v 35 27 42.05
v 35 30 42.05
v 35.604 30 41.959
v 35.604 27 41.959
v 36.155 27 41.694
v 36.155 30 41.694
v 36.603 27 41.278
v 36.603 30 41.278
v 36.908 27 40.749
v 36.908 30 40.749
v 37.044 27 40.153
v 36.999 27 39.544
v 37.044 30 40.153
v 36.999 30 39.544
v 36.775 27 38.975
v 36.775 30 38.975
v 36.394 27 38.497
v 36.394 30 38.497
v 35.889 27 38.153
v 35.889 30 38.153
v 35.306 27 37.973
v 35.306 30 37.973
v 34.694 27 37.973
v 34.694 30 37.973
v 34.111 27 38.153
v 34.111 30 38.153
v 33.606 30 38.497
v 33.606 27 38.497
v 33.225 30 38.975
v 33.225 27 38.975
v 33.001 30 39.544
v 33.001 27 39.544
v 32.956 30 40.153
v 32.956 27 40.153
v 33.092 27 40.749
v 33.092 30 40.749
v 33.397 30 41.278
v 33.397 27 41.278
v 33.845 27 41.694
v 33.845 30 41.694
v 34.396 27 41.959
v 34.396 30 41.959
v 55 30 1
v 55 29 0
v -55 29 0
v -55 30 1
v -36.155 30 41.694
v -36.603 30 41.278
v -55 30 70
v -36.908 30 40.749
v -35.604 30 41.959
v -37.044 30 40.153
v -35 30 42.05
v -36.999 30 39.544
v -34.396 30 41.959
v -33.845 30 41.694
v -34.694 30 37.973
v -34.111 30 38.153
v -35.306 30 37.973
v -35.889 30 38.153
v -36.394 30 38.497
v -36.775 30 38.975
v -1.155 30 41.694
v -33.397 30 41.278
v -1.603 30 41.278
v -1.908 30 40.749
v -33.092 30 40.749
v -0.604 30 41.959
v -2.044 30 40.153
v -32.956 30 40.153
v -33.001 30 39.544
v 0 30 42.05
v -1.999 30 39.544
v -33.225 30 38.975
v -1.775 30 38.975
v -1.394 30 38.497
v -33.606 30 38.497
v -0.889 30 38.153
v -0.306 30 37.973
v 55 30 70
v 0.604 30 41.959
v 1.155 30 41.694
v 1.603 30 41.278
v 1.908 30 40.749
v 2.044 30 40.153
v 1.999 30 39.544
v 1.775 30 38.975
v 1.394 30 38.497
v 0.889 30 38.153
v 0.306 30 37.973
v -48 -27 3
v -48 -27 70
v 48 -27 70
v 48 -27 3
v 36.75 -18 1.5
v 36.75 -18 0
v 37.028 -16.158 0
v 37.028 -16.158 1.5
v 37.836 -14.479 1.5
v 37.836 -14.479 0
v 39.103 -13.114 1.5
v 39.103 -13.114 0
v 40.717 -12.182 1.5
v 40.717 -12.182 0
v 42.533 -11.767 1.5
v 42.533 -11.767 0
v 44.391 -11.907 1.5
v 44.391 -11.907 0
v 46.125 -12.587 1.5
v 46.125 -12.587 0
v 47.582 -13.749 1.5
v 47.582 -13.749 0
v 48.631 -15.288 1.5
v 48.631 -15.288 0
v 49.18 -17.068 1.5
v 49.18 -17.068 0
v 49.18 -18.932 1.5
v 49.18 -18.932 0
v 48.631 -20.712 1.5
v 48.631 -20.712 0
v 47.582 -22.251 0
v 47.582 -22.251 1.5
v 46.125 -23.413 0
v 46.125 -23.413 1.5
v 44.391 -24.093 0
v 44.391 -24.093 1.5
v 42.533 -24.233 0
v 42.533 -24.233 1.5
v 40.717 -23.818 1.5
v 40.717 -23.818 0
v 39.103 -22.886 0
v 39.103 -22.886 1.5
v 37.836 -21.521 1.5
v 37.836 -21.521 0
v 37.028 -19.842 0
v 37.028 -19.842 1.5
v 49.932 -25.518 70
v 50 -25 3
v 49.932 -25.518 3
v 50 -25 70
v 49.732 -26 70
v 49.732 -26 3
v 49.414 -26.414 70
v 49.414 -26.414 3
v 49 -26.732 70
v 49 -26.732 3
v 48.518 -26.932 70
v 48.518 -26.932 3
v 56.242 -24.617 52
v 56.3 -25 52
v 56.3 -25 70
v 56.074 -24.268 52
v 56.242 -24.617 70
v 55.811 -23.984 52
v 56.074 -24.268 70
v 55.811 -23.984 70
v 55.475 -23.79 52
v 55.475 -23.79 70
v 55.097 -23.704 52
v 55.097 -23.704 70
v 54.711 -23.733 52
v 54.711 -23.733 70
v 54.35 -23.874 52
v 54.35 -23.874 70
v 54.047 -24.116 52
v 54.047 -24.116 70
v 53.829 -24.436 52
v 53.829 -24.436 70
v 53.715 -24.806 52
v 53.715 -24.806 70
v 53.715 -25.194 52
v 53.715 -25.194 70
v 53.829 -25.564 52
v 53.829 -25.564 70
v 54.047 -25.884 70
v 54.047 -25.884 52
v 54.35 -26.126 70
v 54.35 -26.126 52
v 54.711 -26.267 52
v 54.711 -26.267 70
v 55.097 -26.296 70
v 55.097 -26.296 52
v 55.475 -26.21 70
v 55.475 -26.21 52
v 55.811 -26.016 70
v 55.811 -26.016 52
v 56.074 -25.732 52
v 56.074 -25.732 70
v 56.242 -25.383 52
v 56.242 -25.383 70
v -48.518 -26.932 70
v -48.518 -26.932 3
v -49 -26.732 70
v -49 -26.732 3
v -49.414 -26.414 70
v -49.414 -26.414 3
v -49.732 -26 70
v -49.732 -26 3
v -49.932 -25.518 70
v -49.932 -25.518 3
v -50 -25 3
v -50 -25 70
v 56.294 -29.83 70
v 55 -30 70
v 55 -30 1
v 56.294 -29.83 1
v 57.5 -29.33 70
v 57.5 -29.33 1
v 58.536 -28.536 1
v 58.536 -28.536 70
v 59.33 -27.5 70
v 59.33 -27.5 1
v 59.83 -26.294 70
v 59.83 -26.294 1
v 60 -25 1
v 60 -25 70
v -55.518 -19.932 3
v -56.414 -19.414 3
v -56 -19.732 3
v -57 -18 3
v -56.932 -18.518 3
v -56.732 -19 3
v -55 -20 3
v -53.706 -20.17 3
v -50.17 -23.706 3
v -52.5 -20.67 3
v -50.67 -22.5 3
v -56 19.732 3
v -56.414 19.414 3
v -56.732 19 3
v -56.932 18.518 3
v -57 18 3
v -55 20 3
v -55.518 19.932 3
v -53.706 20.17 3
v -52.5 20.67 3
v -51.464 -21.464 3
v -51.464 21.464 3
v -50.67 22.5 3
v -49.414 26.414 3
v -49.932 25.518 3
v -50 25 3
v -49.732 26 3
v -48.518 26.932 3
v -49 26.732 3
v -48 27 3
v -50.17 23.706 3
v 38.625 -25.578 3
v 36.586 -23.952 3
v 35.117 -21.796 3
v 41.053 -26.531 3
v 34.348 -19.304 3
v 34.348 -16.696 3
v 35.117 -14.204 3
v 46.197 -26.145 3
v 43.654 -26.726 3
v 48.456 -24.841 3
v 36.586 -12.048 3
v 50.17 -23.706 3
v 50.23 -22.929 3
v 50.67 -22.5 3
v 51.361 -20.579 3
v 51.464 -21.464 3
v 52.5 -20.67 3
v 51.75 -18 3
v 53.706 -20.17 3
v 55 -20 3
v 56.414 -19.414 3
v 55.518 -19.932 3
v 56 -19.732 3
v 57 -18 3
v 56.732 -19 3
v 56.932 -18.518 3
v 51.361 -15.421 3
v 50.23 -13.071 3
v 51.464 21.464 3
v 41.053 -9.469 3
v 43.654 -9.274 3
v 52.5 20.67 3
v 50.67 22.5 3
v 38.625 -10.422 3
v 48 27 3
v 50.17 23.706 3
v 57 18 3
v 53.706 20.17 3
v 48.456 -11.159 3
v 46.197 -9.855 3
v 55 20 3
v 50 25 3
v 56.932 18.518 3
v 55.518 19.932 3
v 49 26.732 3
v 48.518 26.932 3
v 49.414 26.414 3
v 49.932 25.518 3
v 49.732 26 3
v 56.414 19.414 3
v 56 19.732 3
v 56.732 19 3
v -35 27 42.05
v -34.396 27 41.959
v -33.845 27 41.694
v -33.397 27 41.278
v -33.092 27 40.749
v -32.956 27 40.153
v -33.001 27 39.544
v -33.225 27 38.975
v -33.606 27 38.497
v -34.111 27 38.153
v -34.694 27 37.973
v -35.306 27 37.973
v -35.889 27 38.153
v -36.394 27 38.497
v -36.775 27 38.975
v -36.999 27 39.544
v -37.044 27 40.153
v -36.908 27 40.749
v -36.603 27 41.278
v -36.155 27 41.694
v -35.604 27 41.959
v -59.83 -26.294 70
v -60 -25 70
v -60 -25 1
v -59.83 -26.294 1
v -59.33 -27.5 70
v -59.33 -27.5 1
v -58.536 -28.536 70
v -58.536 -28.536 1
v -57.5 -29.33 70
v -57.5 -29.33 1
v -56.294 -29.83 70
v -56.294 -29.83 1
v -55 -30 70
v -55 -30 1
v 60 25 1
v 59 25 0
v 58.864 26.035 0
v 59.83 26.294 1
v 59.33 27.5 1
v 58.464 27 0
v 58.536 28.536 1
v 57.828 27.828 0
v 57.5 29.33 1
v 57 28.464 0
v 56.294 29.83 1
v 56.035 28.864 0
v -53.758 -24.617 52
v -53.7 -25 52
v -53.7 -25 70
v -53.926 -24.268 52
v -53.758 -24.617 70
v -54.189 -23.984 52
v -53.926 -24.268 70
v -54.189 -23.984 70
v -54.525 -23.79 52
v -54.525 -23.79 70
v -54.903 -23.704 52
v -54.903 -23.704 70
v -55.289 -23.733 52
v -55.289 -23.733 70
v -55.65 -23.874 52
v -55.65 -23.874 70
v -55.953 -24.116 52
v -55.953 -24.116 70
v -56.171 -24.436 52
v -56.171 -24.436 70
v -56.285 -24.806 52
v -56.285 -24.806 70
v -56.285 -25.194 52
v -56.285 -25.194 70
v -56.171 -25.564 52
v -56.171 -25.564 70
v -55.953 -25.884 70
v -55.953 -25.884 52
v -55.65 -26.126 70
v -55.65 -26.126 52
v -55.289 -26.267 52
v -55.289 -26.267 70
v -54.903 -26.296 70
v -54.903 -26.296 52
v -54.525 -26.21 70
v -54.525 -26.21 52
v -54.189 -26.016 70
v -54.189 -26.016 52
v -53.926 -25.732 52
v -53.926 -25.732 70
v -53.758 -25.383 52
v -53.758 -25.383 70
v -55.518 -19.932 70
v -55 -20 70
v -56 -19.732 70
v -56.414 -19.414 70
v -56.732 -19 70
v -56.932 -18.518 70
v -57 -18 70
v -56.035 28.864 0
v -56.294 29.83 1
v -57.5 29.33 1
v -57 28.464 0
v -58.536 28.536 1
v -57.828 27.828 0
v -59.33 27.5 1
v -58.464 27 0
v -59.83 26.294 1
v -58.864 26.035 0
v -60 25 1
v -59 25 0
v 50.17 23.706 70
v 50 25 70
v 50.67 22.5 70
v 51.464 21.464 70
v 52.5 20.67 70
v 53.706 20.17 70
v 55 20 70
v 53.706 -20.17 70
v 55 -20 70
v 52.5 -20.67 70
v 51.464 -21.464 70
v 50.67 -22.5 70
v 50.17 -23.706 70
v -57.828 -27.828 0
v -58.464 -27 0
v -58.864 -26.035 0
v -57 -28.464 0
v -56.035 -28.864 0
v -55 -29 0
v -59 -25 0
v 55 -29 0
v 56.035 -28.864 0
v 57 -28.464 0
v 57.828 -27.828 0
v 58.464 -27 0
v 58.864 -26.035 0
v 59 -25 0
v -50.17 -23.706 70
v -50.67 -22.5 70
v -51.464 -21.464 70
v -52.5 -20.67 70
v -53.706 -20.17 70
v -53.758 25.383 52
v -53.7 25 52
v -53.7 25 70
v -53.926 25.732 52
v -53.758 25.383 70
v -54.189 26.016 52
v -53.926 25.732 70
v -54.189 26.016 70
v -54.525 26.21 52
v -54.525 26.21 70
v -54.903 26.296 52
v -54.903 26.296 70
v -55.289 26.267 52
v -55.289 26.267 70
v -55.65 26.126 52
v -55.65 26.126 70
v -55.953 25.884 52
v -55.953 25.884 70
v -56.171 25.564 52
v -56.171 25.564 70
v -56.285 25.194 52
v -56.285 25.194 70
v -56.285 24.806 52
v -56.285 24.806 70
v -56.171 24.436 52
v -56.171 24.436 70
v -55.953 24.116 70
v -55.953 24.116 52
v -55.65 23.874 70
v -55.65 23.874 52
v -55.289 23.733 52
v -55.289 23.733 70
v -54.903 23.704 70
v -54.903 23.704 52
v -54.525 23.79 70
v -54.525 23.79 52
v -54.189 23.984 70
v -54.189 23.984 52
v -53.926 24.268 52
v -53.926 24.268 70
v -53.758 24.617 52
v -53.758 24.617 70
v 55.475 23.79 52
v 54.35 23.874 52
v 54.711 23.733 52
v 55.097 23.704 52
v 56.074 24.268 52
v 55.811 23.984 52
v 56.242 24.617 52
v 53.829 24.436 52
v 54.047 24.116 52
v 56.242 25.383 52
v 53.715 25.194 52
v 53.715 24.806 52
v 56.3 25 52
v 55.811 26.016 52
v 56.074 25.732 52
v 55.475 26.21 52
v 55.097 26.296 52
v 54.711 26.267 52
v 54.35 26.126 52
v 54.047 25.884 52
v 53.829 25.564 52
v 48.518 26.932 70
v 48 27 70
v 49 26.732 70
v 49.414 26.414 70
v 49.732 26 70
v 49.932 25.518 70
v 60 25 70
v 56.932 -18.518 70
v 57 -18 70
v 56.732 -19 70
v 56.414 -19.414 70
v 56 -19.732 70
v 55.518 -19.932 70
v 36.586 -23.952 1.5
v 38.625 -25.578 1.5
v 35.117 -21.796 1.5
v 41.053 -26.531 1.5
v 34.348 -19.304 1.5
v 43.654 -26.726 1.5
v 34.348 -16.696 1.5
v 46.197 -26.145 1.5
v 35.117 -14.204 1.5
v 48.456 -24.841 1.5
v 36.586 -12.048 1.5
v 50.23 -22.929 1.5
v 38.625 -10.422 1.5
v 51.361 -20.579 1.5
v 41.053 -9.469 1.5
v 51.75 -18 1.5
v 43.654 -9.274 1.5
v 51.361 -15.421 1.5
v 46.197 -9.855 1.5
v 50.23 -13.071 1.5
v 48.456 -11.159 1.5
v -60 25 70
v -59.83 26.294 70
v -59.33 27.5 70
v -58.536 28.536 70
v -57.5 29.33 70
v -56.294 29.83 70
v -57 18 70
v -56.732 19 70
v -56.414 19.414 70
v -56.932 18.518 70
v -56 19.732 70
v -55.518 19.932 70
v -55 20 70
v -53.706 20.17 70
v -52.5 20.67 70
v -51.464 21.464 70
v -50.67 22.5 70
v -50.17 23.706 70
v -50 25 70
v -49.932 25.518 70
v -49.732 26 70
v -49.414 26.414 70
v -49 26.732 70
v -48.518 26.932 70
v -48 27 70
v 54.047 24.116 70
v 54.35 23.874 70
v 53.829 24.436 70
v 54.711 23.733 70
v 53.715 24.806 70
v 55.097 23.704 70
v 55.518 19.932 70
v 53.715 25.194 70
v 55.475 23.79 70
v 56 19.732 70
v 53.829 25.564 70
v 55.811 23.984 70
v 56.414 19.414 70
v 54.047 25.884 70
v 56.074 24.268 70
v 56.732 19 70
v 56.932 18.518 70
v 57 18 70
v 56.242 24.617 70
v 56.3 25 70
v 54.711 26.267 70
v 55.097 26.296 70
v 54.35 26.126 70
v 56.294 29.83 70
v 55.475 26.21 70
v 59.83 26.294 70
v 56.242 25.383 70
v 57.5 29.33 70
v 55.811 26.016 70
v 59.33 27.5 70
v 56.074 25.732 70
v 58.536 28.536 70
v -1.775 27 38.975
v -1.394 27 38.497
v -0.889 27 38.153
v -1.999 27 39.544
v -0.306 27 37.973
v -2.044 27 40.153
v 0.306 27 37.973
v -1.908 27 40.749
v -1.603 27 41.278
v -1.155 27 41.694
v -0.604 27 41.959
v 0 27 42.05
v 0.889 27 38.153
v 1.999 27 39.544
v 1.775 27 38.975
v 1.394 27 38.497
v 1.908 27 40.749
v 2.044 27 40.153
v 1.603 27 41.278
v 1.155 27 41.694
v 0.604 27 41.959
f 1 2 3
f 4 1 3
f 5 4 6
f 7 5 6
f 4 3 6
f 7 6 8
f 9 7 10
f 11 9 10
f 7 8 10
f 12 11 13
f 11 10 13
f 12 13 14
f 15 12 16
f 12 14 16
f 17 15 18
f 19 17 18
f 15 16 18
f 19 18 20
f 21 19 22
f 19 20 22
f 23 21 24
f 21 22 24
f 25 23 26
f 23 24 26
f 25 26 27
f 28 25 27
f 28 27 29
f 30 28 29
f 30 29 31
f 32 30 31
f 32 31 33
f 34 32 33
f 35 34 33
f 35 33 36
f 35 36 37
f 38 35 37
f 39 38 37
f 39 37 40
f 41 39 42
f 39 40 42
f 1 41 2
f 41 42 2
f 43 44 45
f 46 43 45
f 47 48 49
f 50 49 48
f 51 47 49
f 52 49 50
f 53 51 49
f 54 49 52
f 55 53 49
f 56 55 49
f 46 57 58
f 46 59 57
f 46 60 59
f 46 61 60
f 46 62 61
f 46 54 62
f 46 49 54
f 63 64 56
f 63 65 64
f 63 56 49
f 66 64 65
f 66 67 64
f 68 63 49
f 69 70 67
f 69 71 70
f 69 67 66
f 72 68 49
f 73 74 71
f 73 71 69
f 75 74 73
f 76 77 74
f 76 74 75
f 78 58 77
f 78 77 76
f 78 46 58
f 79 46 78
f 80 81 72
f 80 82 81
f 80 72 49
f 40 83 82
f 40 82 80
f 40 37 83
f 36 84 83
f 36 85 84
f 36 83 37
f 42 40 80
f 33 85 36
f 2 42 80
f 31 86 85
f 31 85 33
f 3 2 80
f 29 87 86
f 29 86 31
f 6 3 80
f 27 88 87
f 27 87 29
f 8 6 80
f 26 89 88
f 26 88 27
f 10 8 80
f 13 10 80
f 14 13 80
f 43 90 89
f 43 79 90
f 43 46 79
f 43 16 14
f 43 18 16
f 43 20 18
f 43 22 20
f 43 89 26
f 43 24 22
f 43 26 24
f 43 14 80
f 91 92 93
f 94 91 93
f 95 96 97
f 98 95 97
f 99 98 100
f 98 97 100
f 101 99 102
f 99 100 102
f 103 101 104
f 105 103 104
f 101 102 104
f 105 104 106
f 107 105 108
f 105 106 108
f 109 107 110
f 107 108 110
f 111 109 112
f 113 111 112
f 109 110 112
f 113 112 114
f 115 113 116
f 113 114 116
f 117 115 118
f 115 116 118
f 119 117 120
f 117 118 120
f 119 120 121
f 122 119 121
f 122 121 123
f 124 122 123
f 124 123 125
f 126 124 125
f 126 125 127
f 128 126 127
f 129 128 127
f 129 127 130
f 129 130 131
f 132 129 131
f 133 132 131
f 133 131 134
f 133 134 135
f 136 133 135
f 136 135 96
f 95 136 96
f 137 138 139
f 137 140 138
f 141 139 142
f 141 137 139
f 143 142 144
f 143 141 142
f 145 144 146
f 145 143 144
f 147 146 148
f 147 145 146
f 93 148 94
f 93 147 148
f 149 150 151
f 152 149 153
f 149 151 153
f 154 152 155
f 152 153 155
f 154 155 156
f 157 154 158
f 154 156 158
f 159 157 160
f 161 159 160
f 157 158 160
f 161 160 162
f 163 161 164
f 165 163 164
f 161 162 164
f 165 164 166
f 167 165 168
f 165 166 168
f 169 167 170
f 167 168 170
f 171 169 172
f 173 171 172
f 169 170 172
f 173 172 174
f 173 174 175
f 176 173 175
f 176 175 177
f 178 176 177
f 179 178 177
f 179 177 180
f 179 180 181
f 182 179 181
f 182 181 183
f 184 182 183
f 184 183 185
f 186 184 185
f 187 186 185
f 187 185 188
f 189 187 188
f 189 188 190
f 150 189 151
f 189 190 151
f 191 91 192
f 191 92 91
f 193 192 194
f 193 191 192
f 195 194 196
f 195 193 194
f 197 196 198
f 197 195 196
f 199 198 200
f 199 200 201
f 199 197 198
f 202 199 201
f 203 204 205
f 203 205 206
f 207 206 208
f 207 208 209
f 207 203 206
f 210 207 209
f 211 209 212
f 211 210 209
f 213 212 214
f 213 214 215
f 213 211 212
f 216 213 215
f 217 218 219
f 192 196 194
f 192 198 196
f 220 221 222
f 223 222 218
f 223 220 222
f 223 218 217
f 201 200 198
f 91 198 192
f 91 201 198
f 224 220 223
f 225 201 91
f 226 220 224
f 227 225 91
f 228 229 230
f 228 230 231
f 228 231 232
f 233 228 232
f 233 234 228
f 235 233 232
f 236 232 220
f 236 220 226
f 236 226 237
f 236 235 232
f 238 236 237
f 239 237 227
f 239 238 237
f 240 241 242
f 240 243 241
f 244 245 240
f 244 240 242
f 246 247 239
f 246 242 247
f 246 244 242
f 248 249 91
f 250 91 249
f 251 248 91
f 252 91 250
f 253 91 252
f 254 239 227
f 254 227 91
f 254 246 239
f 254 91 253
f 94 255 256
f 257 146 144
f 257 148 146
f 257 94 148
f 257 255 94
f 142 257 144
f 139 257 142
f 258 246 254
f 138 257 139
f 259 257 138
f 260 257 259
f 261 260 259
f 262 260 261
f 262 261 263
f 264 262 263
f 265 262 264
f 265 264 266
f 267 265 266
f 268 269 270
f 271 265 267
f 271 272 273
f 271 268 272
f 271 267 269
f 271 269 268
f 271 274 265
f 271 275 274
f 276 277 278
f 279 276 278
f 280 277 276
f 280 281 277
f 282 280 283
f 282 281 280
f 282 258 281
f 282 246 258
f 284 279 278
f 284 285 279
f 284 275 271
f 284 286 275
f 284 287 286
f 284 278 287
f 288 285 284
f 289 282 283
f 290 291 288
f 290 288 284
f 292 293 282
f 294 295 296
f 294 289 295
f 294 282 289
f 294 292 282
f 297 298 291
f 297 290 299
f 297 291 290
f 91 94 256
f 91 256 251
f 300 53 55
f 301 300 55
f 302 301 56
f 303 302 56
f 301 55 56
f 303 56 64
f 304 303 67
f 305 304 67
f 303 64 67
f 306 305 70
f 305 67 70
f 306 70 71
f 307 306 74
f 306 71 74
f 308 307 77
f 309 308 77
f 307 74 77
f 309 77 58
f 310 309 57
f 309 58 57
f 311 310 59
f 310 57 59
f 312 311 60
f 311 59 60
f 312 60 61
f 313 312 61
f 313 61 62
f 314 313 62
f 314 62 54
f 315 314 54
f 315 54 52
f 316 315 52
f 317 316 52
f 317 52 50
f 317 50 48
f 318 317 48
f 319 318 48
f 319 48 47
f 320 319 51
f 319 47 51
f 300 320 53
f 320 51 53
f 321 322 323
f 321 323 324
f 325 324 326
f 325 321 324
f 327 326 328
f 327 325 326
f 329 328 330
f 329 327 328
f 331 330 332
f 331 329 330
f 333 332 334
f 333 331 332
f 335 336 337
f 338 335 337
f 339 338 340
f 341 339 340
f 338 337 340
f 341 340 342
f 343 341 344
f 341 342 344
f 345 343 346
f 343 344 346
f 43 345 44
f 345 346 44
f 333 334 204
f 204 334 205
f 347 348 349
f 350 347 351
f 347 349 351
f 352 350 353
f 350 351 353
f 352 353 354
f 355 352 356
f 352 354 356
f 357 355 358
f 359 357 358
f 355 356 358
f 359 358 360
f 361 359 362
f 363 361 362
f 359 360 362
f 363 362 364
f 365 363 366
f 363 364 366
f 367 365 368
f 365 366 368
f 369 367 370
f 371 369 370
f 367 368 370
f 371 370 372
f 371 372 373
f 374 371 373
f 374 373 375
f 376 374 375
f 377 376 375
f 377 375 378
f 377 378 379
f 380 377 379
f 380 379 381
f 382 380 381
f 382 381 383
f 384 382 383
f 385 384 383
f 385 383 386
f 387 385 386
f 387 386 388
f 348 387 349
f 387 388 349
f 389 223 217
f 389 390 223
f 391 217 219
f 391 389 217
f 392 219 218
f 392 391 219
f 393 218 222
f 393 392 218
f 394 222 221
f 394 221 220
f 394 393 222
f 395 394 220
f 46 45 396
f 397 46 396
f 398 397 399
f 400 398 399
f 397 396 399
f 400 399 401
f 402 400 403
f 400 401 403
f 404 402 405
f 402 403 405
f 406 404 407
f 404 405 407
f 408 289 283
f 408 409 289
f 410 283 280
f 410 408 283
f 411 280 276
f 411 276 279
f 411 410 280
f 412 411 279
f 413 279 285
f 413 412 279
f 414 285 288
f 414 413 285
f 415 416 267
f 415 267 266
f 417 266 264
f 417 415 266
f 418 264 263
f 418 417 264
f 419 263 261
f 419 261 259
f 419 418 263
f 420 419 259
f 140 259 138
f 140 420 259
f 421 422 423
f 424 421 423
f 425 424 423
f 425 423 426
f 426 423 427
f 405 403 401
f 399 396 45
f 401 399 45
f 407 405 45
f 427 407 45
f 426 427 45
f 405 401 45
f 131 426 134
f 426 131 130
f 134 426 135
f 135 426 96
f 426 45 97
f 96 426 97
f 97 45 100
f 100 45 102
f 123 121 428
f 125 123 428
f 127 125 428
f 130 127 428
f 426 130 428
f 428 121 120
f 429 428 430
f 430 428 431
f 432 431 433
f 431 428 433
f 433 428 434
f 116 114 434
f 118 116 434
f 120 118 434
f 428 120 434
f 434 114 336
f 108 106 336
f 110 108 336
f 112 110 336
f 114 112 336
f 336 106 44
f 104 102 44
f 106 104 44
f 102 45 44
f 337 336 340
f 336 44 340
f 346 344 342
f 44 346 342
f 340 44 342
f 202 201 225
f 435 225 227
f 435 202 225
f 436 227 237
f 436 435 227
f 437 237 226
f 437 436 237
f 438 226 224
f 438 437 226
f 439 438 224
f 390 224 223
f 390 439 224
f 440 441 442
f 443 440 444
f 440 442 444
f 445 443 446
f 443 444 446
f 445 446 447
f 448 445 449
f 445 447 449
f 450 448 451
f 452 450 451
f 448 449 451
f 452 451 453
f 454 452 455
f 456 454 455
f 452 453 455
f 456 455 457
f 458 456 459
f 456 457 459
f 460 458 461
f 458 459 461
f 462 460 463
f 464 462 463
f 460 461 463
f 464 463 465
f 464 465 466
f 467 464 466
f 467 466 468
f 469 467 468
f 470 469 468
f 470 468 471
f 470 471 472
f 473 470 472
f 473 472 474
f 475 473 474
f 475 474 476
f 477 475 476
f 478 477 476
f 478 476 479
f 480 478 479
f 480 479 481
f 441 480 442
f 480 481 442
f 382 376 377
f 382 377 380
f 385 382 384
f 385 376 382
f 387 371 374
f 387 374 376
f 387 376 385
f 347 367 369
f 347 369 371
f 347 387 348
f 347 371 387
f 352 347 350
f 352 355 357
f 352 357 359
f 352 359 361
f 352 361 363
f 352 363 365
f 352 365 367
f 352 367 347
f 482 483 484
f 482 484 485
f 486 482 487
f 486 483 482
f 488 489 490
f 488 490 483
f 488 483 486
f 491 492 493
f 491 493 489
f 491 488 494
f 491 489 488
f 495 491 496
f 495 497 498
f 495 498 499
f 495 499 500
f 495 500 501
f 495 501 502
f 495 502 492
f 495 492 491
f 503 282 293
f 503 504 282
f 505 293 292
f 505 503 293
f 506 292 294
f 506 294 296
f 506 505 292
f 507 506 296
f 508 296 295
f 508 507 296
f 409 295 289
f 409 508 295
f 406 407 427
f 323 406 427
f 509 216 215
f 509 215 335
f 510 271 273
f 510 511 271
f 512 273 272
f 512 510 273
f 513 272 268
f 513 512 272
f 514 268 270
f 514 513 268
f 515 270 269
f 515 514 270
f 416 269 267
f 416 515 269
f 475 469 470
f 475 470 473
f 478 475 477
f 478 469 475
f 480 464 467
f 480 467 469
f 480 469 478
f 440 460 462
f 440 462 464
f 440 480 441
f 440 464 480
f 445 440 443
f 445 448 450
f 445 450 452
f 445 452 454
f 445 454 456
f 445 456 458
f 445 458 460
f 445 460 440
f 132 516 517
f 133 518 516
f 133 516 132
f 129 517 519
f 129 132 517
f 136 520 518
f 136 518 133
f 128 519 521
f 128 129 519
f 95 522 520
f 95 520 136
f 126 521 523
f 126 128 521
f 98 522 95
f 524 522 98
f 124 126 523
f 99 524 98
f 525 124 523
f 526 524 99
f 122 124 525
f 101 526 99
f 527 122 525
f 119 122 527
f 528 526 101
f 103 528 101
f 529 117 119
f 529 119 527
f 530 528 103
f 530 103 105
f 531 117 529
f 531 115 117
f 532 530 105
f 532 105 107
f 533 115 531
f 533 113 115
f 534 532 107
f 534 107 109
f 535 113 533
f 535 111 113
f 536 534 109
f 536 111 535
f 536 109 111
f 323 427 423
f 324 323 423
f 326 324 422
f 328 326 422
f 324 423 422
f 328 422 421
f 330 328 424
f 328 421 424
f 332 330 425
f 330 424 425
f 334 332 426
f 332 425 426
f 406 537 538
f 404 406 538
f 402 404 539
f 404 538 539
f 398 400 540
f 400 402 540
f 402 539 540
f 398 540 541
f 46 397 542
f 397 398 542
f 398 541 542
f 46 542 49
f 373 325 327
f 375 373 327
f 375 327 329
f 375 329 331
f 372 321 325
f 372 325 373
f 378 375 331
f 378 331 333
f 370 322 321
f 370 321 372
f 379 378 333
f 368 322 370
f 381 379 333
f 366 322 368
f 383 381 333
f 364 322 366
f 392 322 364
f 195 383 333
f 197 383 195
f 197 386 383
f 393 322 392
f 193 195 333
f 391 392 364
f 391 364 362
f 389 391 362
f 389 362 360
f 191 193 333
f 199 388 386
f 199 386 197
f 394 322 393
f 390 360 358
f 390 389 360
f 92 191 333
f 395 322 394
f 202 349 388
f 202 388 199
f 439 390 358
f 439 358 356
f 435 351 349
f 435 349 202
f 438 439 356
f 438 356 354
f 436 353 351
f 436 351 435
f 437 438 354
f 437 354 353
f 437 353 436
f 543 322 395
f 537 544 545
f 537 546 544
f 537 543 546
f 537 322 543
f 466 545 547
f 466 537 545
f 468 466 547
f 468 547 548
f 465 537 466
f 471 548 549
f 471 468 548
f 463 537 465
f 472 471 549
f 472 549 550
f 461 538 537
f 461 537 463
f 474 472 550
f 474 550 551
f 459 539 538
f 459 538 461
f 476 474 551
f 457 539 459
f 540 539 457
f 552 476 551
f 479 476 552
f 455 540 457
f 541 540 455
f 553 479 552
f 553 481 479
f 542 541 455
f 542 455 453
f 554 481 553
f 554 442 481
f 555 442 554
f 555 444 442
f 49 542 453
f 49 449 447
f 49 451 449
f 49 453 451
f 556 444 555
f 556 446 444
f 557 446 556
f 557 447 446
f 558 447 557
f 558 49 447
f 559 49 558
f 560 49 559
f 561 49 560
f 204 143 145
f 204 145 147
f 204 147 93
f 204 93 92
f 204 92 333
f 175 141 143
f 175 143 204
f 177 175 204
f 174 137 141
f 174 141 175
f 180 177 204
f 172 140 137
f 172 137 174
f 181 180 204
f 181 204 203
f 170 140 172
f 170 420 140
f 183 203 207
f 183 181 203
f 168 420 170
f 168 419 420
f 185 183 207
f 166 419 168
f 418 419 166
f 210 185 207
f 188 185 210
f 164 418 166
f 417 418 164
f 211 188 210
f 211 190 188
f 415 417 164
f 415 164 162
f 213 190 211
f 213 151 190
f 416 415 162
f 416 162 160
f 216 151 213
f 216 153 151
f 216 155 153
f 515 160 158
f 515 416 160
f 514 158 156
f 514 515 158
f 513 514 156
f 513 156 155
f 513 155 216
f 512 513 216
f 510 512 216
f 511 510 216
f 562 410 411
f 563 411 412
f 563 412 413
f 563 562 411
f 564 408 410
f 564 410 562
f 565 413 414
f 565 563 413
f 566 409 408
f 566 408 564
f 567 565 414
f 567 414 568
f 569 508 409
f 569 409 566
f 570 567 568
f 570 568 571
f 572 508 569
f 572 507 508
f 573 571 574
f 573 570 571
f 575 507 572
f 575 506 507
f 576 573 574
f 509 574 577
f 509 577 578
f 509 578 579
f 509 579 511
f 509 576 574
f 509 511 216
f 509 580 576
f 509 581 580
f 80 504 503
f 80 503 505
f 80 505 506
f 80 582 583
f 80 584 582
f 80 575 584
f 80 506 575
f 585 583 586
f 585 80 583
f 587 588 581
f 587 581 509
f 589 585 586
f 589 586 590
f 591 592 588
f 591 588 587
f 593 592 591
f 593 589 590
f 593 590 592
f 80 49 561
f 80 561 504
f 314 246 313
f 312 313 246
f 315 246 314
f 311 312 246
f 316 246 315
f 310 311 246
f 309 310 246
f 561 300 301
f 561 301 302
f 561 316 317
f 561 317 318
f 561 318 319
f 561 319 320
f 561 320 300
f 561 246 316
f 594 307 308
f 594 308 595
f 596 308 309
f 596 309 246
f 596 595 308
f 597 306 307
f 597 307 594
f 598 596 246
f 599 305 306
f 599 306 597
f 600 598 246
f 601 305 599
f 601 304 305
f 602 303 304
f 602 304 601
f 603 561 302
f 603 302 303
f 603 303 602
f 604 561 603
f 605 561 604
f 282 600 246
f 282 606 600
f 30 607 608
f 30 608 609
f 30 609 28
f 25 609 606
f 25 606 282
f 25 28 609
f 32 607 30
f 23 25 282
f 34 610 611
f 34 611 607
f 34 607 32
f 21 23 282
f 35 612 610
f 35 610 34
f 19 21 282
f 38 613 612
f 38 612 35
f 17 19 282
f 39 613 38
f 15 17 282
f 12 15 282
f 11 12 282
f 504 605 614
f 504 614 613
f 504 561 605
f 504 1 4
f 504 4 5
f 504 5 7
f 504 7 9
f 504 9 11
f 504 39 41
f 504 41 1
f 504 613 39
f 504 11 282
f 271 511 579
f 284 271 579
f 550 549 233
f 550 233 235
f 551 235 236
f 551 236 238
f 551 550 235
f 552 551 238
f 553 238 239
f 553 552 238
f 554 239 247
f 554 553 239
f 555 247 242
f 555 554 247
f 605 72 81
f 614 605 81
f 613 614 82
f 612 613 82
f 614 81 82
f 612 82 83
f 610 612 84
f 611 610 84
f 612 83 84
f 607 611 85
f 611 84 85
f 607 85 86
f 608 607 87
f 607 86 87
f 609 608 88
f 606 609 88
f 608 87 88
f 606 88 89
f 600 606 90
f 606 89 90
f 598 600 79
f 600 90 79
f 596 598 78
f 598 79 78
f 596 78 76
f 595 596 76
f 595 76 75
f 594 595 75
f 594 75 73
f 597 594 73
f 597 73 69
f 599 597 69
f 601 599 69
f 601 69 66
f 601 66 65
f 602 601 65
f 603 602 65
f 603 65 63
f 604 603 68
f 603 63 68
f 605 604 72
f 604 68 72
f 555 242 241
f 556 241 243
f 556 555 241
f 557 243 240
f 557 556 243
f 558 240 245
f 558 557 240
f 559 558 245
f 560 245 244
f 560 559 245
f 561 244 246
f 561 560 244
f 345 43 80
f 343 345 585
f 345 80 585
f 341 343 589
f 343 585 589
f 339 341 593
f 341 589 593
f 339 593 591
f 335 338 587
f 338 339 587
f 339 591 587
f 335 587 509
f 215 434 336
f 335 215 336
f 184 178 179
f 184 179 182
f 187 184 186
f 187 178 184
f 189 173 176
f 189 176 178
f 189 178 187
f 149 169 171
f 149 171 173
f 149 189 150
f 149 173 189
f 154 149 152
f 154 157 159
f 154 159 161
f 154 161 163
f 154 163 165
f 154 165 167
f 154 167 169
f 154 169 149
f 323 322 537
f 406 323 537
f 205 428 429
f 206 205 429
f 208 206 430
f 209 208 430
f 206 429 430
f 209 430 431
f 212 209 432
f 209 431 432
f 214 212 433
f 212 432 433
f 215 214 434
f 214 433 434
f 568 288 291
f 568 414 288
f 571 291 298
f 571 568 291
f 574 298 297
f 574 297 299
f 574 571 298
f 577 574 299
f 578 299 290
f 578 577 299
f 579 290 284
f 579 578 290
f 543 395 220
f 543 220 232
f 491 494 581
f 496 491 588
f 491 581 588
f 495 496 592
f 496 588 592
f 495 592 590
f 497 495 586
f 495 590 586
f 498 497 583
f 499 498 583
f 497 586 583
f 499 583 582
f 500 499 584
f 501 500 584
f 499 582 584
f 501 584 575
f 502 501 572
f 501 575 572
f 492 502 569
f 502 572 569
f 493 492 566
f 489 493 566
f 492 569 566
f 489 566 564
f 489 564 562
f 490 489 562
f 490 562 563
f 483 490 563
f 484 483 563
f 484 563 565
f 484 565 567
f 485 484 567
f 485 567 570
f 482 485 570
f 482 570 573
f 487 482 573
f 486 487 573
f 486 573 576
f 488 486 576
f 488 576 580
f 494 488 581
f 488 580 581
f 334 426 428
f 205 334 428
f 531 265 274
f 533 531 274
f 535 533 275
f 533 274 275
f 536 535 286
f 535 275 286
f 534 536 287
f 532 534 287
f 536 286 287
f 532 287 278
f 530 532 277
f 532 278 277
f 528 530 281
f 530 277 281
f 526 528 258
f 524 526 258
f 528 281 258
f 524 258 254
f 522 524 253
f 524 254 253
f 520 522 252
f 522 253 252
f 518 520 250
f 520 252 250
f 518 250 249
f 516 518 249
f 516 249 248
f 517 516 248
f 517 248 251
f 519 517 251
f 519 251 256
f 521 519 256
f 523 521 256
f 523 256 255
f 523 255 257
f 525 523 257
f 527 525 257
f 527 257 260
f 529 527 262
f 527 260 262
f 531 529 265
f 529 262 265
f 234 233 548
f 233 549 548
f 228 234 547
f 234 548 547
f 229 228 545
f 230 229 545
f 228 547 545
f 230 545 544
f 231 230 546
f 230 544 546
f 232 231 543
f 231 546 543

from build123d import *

# Parameters (mm, degrees)
SKETCH1_W           = 120
SKETCH1_H           = 60
BOSS_EXTRUDE1_DEPTH = 70
SKETCH2_W           = 114
SKETCH2_H           = 54
CUT_EXTRUDE1_DEPTH  = 67
FILLET3_R           = 5
FILLET4_R           = 2
SKETCH4_R           = 5
BOSS_EXTRUDE3_DEPTH = 67
FILLET5_R           = 2
SKETCH5_R           = 1.3
CUT_EXTRUDE2_DEPTH  = 18
SKETCH6_R           = 2.05
CUT_EXTRUDE3_DEPTH  = 3
CHAMFER2_SIZE       = 1
SKETCH7_R           = 6.25
CUT_EXTRUDE4_DEPTH  = 97.953597148
SKETCH8_R           = 8.75
CUT_EXTRUDE5_DEPTH  = 1.5


with BuildPart() as part:
    # Sketch1 → Boss-Extrude1 (new body)
    with BuildSketch(Plane.XY):
        Rectangle(SKETCH1_W, SKETCH1_H)
    extrude(amount=BOSS_EXTRUDE1_DEPTH)

    # Sketch2 → Cut-Extrude1 (cut)
    with BuildSketch(Plane.XY.offset(70)):
        Rectangle(SKETCH2_W, SKETCH2_H)
    extrude(amount=-CUT_EXTRUDE1_DEPTH, mode=Mode.SUBTRACT)

    # Fillet3
    fillet3_edges = [part.edges().sort_by_distance(p)[0] for p in [
        (60, -30, 35),
        (-60, -30, 35),
        (-60, 30, 35),
        (60, 30, 35),
    ]]
    fillet(fillet3_edges, radius=FILLET3_R)

    # Fillet4
    fillet4_edges = [part.edges().sort_by_distance(p)[0] for p in [
        (57, 27, 36.5),
        (57, -27, 36.5),
        (-57, -27, 36.5),
        (-57, 27, 36.5),
    ]]
    fillet(fillet4_edges, radius=FILLET4_R)

    # Sketch4 → Boss-Extrude3 (add)
    with BuildSketch(Plane.XY.offset(70)):
        with Locations((-55, 25)):
            Circle(SKETCH4_R)
        with Locations((55, 25)):
            Circle(SKETCH4_R)
        with Locations((55, -25)):
            Circle(SKETCH4_R)
        with Locations((-55, -25)):
            Circle(SKETCH4_R)
    extrude(amount=-BOSS_EXTRUDE3_DEPTH)

    # Fillet5
    fillet5_edges = [part.edges().sort_by_distance(p)[0] for p in [
        (-50.417424305, -27, 36.5),
        (-57, -20.417424305, 36.5),
        (57, -20.417424305, 36.5),
        (50.417424305, -27, 36.5),
        (50.417424305, 27, 36.5),
        (57, 20.417424305, 36.5),
        (-57, 20.417424305, 36.5),
        (-50.417424305, 27, 36.5),
    ]]
    fillet(fillet5_edges, radius=FILLET5_R)

    # Sketch5 → Cut-Extrude2 (cut)
    with BuildSketch(Plane.XY.offset(70)):
        with Locations((-55, 25)):
            Circle(SKETCH5_R)
        with Locations((55, 25)):
            Circle(SKETCH5_R)
        with Locations((55, -25)):
            Circle(SKETCH5_R)
        with Locations((-55, -25)):
            Circle(SKETCH5_R)
    extrude(amount=-CUT_EXTRUDE2_DEPTH, mode=Mode.SUBTRACT)

    # Sketch6 → Cut-Extrude3 (cut)
    with BuildSketch(Plane(origin=(0, 30, 0), x_dir=(1, 0, 0), z_dir=(0, 1, 0))):
        with Locations(Location((0, -40, 0), (0, 0, 270))):
            Circle(SKETCH6_R)
        with Locations(Location((35, -40, 0), (0, 0, 270))):
            Circle(SKETCH6_R)
        with Locations(Location((-35, -40, 0), (0, 0, 270))):
            Circle(SKETCH6_R)
    extrude(amount=-CUT_EXTRUDE3_DEPTH, mode=Mode.SUBTRACT)

    # Chamfer2
    chamfer2_edges = [part.edges().sort_by_distance(p)[0] for p in [
        (0, -30, 0),
        (60, 0, 0),
        (-60, 0, 0),
        (0, 30, 0),
        (-58.535533906, 28.535533906, 0),
        (58.535533906, 28.535533906, 0),
        (58.535533906, -28.535533906, 0),
        (-58.535533906, -28.535533906, 0),
    ]]
    chamfer(chamfer2_edges, length=CHAMFER2_SIZE)

    # Sketch7 → Cut-Extrude4 (cut, through all)
    with BuildSketch(Plane(origin=(0, 0, 0), x_dir=(-1, 0, 0), z_dir=(0, 0, -1))):
        with Locations((-43, -18)):
            Circle(SKETCH7_R)
    extrude(amount=-CUT_EXTRUDE4_DEPTH, mode=Mode.SUBTRACT)

    # Sketch8 → Cut-Extrude5 (cut)
    with BuildSketch(Plane.XY.offset(3)):
        with Locations((43, -18)):
            Circle(SKETCH8_R)
    extrude(amount=-CUT_EXTRUDE5_DEPTH, mode=Mode.SUBTRACT)


solid = part.part
